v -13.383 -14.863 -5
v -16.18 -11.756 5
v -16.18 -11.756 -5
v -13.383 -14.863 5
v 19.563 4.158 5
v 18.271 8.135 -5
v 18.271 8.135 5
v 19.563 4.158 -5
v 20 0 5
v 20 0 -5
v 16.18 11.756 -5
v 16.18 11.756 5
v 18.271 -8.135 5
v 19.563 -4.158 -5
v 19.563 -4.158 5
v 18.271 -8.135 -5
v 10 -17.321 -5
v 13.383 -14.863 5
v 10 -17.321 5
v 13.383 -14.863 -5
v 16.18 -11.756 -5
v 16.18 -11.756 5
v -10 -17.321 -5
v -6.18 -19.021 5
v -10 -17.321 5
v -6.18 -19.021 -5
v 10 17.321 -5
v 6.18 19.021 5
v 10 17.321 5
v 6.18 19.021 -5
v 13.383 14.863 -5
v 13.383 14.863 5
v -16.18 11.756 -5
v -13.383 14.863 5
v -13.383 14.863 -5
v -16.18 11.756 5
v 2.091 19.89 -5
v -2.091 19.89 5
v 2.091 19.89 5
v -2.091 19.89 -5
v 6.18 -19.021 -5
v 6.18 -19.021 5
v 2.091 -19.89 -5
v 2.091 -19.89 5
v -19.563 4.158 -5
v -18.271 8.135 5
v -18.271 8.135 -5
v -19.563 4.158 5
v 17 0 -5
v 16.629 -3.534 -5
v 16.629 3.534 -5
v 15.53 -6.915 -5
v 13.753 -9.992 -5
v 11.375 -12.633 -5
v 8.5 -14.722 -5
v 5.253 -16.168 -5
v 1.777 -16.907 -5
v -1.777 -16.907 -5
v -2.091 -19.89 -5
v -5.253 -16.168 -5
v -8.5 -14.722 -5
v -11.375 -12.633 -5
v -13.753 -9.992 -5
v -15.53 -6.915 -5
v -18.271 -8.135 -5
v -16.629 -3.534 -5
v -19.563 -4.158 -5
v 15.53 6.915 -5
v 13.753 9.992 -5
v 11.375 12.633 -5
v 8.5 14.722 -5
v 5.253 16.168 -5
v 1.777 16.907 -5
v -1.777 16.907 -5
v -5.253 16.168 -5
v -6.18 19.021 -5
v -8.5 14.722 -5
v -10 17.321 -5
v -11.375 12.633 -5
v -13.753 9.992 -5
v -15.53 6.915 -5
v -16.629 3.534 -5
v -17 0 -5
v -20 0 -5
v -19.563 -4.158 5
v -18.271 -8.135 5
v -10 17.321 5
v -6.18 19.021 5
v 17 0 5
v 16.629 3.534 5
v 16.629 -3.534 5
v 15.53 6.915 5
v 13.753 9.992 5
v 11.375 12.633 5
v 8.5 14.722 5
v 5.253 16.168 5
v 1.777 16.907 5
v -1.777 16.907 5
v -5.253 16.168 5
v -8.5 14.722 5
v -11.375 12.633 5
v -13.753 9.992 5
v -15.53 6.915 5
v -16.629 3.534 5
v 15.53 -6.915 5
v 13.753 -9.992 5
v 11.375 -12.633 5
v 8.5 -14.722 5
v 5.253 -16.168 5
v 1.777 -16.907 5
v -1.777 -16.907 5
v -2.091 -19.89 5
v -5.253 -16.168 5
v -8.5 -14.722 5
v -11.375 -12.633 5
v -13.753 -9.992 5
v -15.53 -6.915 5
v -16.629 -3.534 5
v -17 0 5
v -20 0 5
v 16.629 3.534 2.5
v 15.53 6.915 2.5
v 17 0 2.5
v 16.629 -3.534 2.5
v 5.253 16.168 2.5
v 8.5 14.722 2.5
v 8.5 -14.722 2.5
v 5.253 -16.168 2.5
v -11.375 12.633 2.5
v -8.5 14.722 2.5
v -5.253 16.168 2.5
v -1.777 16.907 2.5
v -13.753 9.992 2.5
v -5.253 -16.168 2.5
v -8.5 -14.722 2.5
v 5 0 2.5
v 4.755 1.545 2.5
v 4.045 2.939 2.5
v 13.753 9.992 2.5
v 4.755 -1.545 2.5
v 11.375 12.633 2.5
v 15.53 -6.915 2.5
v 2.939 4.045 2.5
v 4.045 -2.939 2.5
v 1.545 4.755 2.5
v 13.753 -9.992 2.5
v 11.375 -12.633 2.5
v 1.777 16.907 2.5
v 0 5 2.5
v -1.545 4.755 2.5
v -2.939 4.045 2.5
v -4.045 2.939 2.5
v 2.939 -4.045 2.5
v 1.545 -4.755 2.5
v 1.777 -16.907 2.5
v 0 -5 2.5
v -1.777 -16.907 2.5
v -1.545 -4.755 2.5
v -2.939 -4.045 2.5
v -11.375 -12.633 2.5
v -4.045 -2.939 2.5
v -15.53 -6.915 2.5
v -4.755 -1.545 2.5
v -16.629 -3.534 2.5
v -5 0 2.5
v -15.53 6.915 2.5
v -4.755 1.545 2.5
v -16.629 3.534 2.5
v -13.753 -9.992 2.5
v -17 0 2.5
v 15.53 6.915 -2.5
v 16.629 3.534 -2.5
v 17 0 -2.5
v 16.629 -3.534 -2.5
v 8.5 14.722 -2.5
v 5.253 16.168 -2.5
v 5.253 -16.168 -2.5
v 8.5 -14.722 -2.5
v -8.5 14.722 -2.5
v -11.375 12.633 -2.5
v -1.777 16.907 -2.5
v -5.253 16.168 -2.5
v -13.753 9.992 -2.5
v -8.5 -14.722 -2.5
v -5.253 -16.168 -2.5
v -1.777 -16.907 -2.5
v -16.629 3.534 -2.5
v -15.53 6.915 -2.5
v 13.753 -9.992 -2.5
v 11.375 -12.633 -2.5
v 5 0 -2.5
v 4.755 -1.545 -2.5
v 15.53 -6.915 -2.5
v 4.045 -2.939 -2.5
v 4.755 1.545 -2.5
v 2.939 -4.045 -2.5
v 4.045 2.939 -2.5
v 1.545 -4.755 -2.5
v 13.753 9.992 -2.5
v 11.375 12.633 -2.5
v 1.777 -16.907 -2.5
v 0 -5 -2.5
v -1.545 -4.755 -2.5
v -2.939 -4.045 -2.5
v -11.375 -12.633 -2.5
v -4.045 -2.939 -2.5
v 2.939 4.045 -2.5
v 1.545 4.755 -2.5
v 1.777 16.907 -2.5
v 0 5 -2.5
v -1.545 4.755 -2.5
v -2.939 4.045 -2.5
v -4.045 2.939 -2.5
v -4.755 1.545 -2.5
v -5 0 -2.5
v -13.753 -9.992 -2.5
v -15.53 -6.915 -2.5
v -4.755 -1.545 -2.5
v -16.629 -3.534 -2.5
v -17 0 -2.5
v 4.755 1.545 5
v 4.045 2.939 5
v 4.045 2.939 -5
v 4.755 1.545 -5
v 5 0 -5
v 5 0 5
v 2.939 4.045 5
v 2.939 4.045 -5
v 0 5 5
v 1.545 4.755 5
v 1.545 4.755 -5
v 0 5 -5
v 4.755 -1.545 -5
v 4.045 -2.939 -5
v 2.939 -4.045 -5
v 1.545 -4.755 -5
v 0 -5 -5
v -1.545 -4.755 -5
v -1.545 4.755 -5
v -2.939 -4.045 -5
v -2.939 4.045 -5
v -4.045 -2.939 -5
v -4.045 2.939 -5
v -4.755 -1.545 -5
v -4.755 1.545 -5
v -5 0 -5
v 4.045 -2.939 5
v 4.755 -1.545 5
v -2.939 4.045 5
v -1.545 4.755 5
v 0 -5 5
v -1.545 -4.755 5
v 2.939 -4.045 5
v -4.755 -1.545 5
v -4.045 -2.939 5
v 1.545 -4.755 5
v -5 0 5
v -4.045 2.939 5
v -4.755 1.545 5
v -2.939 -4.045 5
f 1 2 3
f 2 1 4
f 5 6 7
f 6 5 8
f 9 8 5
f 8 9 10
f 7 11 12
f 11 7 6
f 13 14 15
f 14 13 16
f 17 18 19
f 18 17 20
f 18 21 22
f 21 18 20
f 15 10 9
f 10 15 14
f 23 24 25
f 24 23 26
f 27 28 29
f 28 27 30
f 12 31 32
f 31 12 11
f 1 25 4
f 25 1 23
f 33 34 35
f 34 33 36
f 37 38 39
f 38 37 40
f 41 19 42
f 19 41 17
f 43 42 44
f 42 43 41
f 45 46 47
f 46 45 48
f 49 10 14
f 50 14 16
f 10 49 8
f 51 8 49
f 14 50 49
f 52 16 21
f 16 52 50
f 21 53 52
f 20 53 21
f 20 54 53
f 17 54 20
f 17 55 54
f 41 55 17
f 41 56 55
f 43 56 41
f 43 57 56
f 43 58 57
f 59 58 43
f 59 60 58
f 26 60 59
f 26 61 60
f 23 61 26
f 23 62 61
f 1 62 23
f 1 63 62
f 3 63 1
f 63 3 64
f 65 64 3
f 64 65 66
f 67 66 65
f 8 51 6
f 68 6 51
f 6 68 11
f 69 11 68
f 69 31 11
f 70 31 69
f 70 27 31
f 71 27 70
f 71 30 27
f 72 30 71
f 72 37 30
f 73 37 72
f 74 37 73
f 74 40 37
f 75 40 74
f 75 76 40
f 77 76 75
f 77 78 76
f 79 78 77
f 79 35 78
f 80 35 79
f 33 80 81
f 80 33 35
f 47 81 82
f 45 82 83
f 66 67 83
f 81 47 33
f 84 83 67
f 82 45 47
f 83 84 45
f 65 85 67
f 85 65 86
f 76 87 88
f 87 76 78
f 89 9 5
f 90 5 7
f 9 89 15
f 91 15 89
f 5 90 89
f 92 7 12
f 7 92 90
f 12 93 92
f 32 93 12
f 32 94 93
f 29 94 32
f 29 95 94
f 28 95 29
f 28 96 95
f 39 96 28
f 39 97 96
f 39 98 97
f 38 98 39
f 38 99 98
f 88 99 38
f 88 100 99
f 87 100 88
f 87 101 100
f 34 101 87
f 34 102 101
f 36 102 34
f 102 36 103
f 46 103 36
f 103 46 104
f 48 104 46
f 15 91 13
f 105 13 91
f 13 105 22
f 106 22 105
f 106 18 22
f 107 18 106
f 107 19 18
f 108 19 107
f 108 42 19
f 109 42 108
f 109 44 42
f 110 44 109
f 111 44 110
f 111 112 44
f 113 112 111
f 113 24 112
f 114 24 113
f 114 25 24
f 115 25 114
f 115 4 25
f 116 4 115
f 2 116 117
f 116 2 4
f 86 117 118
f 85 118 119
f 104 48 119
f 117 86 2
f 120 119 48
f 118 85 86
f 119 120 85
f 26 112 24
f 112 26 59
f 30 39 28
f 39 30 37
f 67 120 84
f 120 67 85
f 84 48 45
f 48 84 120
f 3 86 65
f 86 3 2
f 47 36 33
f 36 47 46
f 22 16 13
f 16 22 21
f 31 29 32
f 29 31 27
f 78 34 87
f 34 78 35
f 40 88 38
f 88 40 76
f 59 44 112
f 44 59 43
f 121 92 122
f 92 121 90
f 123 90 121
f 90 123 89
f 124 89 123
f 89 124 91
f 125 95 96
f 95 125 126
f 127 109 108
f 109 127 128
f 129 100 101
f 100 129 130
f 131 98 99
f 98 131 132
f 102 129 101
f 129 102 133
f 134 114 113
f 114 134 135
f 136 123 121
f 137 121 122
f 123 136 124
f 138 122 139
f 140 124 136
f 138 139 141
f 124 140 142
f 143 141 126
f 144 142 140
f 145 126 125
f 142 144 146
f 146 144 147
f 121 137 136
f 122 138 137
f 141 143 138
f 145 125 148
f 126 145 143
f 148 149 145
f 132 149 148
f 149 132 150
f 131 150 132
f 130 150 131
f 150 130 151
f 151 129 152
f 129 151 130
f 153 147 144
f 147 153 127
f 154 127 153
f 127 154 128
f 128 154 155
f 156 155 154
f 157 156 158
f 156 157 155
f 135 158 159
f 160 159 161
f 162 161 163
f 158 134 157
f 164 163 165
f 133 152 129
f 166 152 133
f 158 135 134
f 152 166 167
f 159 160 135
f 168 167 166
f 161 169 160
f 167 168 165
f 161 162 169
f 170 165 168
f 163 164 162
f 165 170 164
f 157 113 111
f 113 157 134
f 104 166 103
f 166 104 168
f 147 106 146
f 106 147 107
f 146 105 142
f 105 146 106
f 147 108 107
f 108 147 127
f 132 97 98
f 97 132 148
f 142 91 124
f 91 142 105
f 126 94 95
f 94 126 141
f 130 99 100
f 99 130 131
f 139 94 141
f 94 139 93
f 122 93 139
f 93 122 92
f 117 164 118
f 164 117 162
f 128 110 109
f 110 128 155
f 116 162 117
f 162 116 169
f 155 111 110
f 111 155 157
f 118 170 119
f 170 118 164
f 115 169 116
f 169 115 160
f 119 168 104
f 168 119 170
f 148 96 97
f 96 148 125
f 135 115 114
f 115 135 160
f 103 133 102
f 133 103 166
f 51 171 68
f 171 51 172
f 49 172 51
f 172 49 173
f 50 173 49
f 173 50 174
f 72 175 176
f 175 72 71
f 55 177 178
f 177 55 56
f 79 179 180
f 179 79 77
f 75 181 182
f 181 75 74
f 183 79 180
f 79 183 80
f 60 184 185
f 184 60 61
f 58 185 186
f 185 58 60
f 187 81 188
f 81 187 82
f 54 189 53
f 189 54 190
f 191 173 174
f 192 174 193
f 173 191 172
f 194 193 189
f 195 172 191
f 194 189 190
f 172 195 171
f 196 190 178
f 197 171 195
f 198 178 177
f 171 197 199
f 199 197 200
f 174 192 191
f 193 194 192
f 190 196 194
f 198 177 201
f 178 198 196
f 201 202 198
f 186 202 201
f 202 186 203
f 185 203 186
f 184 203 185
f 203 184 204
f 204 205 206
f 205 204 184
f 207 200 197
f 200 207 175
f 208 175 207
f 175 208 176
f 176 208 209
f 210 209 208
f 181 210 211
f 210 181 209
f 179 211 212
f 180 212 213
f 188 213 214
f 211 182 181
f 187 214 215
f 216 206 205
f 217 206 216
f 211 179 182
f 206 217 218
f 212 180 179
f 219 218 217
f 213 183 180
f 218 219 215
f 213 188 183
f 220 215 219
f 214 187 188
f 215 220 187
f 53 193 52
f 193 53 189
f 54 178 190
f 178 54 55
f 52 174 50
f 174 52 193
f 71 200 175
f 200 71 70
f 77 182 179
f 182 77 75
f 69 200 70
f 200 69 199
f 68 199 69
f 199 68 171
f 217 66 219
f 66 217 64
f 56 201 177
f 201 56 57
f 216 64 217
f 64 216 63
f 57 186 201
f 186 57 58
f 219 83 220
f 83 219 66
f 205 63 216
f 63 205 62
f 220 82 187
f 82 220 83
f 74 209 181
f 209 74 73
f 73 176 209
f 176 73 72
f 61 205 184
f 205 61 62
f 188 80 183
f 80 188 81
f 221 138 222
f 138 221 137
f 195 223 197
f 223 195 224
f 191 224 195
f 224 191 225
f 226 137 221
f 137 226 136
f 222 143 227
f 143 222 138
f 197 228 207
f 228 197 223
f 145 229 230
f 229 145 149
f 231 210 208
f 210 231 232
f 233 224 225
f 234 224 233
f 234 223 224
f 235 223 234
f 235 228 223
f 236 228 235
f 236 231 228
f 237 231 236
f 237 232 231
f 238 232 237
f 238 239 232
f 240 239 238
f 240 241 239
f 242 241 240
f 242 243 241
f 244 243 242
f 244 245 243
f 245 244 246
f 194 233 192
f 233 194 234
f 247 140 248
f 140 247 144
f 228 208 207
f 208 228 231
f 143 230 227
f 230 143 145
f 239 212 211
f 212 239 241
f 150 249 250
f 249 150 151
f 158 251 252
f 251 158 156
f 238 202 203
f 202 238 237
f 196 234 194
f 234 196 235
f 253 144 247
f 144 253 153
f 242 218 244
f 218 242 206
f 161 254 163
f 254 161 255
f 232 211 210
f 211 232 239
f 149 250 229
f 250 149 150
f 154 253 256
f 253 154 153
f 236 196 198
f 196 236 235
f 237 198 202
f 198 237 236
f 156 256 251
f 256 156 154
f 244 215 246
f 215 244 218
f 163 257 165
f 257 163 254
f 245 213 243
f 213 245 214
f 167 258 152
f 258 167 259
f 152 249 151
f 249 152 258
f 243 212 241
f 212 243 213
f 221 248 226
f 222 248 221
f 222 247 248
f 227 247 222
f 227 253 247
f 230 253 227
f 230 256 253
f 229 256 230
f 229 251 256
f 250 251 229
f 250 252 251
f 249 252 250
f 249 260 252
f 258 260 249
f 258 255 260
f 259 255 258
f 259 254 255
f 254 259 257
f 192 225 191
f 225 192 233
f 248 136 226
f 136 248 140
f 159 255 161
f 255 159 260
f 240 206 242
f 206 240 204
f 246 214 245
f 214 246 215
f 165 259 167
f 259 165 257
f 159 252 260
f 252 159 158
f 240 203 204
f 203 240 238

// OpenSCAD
module rueda(radioRueda,ancho,radioInterno, anchoInterno, radioPalier, anchoPalier){ 
    union(){
        difference(){
            // rueda
            cylinder(h= ancho, r = radioRueda, center = true);
            translate([0, 0, 4])
            // rueda interna
            cylinder(h= anchoInterno, r = radioInterno, center = true);
            translate([0, 0, -4])
            // rueda interna
            cylinder(h= anchoInterno, r = radioInterno, center = true);
        }
        //Palier
            cylinder(h= anchoPalier, r = radioPalier, center = true, $fn=20);
}
}

rueda(20,10,17,3,5,10);
